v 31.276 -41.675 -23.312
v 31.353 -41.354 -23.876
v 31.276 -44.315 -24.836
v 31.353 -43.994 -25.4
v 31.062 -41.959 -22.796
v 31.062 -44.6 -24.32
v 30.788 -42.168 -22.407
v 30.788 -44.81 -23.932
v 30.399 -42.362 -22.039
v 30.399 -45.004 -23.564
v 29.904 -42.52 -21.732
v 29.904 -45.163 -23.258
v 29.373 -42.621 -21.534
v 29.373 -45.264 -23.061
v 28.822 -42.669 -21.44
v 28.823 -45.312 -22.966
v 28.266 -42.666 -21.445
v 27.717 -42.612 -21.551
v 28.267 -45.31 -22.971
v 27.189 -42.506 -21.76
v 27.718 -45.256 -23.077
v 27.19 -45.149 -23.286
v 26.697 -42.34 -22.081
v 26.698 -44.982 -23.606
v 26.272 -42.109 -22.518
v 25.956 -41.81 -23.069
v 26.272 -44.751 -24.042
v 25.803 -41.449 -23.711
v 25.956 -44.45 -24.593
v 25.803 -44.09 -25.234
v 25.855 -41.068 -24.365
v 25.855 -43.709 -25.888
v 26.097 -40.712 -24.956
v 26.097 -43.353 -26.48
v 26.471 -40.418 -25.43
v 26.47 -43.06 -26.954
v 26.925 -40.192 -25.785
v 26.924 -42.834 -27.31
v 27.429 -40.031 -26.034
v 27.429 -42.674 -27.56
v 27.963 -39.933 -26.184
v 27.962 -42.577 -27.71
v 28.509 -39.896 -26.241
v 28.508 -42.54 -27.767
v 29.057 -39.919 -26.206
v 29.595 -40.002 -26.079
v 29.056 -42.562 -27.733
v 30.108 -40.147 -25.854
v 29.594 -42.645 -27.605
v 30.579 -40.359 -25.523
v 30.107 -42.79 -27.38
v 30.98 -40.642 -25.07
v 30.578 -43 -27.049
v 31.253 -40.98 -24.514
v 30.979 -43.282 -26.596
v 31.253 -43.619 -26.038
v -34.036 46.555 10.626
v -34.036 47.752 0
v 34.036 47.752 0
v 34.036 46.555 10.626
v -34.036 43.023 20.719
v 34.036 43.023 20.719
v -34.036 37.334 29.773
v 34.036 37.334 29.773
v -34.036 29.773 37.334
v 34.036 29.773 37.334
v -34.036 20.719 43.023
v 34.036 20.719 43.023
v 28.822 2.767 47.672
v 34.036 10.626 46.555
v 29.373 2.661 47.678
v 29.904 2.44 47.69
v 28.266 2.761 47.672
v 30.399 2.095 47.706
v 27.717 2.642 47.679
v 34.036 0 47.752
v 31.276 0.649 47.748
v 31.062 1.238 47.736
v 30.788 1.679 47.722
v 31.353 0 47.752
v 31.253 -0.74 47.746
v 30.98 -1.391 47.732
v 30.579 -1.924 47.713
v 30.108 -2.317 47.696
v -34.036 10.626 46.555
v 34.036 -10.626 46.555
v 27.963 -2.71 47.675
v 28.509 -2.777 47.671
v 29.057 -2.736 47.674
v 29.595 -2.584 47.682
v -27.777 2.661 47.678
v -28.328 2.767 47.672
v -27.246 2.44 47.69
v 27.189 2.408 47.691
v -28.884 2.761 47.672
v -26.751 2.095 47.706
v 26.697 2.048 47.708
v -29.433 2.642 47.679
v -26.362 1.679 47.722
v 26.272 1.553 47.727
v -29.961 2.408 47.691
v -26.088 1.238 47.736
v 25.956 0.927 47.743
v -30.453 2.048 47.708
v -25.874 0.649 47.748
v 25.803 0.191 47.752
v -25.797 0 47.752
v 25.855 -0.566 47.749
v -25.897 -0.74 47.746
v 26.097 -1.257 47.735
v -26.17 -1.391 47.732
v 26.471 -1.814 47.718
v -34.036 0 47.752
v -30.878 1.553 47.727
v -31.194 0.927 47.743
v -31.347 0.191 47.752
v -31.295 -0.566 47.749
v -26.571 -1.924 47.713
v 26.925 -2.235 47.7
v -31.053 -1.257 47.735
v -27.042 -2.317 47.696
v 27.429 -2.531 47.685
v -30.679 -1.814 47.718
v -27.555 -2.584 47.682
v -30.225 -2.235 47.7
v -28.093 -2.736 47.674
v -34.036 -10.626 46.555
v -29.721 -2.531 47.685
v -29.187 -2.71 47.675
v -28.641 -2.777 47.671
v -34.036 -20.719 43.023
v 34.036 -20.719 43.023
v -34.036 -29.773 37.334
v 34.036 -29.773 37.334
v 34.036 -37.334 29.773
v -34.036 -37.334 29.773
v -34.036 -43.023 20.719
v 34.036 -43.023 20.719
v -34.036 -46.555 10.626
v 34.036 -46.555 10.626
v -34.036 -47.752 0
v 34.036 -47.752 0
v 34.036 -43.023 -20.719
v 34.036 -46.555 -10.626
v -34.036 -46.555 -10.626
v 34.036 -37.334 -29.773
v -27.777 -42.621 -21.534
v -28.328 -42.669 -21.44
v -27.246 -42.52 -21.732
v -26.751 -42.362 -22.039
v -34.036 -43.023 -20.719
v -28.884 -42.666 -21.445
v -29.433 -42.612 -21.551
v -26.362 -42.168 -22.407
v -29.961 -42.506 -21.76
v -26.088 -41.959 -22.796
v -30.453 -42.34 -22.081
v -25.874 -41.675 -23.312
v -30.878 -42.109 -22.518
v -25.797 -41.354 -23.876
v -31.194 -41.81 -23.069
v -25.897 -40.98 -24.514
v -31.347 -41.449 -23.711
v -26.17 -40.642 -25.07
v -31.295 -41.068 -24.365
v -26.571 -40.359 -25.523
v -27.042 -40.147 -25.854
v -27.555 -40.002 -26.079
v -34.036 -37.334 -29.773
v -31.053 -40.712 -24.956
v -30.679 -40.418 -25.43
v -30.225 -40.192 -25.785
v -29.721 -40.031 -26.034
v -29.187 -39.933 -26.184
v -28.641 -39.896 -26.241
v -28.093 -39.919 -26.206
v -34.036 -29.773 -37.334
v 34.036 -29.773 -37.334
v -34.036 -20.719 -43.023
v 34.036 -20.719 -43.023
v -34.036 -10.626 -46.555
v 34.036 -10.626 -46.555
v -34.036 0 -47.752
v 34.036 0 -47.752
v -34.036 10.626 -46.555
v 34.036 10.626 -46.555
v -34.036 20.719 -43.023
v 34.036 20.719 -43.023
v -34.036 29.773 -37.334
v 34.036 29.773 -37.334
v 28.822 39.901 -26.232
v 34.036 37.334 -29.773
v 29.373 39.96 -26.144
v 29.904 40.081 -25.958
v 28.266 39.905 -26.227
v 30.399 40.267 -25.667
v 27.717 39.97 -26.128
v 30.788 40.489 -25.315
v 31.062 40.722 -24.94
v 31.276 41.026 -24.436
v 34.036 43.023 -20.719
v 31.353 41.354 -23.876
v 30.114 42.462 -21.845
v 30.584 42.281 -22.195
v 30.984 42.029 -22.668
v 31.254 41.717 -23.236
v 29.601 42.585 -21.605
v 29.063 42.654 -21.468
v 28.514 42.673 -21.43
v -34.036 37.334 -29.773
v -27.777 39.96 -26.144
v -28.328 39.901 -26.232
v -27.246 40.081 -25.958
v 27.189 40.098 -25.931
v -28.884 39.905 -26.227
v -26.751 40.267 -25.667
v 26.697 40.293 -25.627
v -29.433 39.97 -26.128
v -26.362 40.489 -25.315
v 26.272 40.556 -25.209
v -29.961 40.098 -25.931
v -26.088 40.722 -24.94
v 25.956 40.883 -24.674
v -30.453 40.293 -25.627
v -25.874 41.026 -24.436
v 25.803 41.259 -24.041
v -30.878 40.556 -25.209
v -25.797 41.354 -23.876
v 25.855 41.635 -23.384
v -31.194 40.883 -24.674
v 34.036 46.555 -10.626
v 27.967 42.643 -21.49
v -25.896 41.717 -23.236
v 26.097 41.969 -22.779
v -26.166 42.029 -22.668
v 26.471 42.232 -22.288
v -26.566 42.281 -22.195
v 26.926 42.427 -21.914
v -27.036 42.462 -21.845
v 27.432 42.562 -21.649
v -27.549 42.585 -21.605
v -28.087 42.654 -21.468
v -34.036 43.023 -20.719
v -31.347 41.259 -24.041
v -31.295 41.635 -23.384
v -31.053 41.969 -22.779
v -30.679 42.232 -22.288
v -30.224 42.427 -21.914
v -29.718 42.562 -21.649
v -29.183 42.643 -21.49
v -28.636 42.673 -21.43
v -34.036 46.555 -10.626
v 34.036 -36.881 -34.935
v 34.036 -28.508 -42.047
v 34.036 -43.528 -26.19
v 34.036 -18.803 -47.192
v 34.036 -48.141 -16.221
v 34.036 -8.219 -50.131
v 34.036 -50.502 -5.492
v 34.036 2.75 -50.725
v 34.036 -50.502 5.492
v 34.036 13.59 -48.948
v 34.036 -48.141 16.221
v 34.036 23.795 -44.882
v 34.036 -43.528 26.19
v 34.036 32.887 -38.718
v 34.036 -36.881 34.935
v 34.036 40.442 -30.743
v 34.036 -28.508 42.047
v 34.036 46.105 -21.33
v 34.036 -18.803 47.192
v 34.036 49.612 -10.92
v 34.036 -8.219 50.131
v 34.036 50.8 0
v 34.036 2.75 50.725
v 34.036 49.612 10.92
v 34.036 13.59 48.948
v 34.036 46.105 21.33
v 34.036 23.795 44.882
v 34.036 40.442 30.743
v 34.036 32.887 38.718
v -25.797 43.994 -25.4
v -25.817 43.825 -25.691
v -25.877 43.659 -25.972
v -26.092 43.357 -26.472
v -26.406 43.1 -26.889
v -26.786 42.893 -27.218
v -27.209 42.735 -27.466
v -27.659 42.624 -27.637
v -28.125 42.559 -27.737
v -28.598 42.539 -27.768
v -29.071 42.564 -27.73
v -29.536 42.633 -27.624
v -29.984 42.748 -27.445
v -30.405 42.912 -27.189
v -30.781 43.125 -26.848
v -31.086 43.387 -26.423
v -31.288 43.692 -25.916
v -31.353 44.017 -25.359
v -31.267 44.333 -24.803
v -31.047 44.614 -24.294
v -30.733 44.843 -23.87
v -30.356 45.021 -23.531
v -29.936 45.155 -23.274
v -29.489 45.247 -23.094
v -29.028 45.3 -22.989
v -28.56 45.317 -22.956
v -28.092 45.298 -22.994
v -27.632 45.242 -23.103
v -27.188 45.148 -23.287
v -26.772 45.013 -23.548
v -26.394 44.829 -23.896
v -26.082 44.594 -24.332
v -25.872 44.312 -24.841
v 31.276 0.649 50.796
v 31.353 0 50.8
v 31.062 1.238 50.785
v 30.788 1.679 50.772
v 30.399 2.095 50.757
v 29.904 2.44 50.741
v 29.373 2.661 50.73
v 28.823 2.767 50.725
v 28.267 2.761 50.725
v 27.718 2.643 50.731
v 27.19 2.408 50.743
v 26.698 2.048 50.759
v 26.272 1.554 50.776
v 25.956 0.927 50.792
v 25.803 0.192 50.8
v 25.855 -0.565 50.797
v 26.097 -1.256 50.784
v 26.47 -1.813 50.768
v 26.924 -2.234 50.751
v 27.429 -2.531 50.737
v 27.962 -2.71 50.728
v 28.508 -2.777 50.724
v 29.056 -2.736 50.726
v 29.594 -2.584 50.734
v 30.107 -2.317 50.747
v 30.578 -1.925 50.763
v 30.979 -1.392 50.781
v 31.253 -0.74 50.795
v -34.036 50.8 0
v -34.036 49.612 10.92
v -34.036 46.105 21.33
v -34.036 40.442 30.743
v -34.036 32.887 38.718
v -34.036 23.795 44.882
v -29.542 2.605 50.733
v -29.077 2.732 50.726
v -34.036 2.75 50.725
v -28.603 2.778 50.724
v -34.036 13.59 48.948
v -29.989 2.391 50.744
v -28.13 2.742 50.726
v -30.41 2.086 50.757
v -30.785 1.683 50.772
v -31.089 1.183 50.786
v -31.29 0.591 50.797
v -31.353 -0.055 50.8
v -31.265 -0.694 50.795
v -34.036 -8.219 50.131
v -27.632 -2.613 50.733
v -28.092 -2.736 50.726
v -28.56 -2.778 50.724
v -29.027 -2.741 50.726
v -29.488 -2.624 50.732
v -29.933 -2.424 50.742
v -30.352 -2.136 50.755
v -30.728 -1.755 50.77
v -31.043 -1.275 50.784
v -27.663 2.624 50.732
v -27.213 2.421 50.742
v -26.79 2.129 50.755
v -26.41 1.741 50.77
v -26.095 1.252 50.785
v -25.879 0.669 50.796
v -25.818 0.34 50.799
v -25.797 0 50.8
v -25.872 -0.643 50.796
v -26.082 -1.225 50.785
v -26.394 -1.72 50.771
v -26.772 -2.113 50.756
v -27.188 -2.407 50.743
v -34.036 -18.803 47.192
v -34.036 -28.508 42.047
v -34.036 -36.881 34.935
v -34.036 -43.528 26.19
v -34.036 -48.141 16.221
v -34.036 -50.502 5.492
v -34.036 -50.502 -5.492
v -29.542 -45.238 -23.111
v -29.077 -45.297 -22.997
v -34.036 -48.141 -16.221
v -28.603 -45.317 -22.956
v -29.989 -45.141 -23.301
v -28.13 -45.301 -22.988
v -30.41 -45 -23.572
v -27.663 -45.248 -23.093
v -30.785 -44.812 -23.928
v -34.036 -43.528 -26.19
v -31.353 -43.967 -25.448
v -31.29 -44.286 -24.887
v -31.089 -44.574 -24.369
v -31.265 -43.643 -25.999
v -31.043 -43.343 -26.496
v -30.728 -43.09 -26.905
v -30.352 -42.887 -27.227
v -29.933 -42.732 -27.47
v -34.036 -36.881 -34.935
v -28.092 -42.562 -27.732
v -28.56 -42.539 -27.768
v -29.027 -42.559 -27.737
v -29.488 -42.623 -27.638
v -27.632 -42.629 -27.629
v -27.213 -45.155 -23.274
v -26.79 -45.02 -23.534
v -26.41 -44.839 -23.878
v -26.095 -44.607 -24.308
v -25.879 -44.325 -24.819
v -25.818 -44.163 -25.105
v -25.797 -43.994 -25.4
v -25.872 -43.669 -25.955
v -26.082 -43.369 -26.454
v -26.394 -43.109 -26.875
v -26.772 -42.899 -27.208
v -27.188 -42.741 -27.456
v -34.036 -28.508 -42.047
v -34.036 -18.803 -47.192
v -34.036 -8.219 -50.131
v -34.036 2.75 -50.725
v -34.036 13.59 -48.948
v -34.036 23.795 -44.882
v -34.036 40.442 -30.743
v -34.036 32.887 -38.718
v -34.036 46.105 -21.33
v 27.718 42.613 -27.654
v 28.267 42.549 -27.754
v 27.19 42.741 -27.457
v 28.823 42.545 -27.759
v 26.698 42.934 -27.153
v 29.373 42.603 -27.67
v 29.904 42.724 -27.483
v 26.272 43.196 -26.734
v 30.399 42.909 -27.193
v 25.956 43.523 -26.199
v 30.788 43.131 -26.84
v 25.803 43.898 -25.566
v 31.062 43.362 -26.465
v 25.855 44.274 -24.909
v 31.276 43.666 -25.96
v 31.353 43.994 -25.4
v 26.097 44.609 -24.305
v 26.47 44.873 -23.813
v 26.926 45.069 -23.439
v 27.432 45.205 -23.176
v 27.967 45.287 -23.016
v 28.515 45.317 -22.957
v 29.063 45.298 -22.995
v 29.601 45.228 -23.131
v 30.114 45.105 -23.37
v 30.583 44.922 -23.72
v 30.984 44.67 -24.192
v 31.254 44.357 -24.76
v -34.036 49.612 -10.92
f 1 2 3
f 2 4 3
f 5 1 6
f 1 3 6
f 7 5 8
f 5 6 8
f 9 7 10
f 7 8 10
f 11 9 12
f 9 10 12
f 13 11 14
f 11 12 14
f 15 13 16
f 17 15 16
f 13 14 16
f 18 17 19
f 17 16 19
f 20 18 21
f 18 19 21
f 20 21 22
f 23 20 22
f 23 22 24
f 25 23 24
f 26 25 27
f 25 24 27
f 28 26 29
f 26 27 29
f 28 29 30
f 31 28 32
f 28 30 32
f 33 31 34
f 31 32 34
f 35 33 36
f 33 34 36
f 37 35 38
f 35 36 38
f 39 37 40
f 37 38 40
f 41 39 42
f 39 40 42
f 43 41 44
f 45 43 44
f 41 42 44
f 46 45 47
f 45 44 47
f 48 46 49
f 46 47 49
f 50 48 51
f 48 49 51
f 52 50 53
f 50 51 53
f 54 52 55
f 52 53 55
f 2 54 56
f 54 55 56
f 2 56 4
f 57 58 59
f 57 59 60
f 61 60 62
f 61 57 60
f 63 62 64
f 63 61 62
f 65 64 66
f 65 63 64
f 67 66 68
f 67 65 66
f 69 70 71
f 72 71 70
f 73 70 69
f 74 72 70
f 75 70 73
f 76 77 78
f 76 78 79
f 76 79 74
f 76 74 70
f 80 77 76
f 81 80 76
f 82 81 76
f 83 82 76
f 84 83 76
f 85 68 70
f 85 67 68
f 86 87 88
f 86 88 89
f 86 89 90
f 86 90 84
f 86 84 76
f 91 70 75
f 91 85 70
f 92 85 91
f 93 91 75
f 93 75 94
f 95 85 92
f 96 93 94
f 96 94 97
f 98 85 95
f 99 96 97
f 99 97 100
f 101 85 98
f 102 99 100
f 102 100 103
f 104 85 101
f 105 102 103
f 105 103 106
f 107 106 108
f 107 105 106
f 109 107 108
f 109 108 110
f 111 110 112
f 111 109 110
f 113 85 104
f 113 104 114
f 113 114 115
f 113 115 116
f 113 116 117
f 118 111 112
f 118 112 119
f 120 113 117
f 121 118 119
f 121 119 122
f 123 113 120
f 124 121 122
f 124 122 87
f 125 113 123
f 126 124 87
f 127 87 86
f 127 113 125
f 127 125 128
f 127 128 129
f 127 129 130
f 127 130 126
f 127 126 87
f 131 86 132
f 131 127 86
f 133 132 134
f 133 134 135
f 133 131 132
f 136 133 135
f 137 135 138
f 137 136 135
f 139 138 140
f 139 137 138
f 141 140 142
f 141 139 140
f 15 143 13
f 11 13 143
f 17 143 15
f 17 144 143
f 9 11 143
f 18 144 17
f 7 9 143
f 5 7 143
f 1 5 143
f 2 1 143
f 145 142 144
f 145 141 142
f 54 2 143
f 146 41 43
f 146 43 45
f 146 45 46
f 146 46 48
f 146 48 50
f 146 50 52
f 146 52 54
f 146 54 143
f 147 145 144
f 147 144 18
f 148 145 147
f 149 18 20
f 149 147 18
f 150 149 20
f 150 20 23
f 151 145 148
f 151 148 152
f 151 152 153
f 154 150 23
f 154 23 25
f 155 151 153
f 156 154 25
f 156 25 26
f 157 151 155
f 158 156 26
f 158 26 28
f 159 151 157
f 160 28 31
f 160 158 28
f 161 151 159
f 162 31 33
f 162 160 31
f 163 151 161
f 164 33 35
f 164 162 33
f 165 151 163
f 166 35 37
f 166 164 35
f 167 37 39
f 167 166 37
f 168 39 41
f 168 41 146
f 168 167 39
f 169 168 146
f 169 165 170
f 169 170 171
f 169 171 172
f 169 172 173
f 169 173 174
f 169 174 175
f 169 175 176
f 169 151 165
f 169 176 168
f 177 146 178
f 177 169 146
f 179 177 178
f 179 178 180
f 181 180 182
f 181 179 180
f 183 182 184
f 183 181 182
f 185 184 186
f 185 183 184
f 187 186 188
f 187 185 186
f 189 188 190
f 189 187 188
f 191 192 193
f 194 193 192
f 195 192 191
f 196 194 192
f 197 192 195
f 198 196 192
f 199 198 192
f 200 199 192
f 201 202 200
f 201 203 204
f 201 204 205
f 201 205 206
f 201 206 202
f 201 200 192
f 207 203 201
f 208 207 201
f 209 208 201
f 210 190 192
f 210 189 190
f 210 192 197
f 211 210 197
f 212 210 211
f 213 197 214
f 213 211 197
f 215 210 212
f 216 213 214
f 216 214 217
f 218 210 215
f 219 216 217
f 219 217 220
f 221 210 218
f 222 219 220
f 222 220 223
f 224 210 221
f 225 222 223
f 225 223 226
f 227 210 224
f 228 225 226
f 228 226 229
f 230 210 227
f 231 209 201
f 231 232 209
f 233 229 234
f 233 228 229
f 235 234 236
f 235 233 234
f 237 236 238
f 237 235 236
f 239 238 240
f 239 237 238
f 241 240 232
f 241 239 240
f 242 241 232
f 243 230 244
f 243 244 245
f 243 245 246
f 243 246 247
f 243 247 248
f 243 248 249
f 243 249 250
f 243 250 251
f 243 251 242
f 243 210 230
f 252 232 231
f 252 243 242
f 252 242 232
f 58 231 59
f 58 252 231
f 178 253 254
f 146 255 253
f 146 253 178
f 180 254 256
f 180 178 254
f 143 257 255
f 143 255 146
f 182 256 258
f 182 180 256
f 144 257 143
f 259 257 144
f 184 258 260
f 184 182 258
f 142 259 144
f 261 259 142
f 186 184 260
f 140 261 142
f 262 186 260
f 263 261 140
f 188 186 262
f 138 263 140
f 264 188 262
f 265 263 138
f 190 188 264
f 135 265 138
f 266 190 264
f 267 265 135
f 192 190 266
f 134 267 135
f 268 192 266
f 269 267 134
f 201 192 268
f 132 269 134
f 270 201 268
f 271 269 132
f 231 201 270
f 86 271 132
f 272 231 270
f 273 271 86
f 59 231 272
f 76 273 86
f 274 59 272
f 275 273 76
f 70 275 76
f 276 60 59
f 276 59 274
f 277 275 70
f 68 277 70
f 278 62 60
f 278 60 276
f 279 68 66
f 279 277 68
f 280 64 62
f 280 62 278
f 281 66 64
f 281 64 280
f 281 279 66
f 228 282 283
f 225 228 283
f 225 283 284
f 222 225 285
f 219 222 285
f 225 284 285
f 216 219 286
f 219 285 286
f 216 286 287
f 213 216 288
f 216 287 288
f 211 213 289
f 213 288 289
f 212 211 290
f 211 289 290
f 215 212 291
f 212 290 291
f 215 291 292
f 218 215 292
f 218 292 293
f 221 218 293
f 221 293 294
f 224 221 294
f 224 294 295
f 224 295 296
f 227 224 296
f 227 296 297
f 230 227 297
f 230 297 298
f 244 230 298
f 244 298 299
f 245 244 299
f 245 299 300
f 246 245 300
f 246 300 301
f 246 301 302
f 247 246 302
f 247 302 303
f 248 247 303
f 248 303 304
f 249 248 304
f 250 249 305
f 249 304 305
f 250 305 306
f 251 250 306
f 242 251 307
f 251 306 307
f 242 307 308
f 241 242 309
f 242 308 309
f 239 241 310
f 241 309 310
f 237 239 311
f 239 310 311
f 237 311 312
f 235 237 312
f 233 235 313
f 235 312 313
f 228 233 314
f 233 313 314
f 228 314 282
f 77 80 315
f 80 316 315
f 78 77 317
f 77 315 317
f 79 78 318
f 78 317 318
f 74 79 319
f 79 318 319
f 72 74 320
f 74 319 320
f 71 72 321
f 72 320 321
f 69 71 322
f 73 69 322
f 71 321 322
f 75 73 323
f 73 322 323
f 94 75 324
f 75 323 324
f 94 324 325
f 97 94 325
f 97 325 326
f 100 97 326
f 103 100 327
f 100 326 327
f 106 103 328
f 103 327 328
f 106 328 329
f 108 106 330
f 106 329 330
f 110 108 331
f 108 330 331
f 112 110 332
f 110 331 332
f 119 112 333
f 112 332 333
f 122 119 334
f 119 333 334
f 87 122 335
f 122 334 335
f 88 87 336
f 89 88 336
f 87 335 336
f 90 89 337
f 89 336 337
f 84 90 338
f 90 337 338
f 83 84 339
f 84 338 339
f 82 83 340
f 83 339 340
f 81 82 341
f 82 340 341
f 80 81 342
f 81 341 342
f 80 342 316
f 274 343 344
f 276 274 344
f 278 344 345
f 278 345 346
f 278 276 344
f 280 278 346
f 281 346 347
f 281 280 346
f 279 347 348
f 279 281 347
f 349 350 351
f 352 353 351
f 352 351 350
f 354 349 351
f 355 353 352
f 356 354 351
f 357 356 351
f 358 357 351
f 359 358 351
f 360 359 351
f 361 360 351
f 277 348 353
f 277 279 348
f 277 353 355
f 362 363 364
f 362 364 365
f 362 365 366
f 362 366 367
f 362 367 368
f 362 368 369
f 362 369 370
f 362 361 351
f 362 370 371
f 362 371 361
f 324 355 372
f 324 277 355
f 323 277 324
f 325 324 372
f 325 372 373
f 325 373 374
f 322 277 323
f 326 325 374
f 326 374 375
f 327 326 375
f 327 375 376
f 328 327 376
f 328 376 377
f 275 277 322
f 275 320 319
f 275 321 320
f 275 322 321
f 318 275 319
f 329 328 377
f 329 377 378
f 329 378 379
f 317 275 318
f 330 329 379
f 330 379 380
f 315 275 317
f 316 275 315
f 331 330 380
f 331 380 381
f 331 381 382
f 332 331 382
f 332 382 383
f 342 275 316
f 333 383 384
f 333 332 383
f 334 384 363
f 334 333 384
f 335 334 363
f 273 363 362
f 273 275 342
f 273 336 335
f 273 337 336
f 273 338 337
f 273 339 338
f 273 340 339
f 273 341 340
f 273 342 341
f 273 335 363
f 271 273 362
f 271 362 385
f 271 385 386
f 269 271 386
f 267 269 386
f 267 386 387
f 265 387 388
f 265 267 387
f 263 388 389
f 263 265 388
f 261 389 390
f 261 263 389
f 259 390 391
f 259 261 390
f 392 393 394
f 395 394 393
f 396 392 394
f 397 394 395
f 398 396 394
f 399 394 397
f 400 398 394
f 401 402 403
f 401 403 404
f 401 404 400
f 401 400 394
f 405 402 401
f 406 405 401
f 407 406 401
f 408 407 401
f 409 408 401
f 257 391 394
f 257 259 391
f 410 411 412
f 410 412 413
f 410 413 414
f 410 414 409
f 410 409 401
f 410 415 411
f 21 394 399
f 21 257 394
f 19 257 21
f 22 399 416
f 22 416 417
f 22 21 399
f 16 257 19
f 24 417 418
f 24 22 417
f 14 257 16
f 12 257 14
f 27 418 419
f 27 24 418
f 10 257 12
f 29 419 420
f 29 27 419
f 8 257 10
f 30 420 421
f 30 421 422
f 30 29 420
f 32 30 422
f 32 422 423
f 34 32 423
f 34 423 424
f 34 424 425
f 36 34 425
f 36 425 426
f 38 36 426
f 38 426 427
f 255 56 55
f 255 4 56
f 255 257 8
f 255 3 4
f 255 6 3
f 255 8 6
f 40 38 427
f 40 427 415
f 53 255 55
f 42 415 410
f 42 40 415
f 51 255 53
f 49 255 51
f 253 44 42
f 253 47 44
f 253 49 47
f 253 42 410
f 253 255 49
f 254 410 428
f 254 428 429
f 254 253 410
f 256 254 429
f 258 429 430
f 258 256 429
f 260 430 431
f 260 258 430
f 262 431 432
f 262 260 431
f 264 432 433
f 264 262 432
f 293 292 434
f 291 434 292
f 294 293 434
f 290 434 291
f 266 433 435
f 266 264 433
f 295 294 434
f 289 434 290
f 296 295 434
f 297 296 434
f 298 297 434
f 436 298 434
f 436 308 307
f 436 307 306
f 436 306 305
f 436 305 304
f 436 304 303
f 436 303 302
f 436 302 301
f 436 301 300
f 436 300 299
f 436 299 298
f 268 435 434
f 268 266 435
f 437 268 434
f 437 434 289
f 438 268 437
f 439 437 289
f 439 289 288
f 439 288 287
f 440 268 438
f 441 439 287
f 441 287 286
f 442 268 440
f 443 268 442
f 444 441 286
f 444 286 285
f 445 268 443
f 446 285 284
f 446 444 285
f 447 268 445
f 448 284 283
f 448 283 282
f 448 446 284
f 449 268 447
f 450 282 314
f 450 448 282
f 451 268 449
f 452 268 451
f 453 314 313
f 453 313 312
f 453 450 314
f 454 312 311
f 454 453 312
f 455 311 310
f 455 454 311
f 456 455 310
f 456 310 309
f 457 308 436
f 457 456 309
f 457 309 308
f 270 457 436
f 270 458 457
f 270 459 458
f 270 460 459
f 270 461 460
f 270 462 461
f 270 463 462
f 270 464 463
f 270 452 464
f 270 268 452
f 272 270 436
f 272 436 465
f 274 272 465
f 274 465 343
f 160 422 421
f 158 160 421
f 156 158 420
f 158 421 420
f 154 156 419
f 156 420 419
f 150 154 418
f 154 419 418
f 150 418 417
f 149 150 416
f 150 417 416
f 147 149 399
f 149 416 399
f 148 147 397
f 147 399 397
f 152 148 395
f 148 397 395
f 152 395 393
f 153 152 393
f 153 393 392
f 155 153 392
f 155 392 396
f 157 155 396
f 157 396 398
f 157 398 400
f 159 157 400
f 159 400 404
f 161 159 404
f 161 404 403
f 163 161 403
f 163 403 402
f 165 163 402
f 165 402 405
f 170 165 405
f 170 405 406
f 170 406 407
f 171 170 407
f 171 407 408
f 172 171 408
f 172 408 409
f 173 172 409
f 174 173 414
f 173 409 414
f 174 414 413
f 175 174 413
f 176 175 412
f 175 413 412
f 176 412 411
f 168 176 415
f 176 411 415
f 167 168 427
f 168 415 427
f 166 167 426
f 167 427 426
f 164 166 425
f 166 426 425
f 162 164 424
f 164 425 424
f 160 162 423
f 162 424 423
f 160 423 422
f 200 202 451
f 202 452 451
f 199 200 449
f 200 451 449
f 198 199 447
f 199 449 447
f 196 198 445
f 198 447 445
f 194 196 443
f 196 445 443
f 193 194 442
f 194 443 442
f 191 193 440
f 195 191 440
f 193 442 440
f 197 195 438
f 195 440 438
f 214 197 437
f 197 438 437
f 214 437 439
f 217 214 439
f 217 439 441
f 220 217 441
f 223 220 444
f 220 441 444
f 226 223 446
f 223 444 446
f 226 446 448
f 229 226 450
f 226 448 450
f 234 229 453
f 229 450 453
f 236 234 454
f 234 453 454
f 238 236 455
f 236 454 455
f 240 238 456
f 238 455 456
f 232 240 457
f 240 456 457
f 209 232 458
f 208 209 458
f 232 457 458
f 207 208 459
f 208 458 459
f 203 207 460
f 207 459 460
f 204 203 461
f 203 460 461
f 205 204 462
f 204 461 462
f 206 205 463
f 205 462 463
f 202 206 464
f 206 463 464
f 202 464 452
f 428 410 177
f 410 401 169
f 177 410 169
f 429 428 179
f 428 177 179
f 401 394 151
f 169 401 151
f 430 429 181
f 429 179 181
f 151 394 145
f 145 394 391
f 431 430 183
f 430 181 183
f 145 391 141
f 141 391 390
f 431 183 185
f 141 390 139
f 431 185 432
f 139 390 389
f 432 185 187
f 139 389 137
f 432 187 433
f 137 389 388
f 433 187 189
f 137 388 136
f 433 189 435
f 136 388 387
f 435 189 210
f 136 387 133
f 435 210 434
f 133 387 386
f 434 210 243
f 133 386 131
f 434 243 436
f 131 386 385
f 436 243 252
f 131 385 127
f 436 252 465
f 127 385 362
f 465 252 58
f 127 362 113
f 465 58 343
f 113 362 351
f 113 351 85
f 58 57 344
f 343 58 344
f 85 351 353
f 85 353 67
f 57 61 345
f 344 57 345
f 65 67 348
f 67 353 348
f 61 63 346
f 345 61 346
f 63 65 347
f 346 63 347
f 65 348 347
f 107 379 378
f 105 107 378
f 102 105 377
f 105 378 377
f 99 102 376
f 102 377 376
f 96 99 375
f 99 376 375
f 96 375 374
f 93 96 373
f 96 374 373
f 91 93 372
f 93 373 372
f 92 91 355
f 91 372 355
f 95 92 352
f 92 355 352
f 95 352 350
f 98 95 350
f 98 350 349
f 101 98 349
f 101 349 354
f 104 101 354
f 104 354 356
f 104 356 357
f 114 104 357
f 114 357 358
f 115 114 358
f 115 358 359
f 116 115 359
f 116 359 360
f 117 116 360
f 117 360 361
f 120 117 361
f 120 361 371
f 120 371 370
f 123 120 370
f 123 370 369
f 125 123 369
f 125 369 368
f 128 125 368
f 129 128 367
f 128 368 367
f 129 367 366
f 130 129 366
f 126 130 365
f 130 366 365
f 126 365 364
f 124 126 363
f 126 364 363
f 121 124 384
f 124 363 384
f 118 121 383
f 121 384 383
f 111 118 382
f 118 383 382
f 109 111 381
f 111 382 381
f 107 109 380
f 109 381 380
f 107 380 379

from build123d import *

# Parameters (mm, degrees)
F0_R     = 50.8
F0_R_2   = 47.752
F1_DEPTH = 34.036
F3_R     = 2.778125
F4_DEPTH = 12.7
F6_COUNT = 3
F6_ANGLE = 240


with BuildPart() as f1:
    # F0 (on Right) → F1 (new body, symmetric)
    with BuildSketch(Plane.YZ):
        Circle(F0_R)
        Circle(F0_R_2, mode=Mode.SUBTRACT)
    extrude(amount=F1_DEPTH, both=True)


with BuildPart() as f4:
    # F3 (on offset) → F4 (new body, symmetric)
    with BuildSketch(Plane.XY.offset(50.8)):
        with Locations((-28.575, 0)):
            Circle(F3_R)
        with Locations((28.575, 0)):
            Circle(F3_R)
    extrude(amount=F4_DEPTH, both=True)


with BuildPart() as f6_1:
    # F6: instance of F4
    add(f4.part.rotate(Axis((2.265271, 0, 0), (1, 0, 0)), 1 * F6_ANGLE / (F6_COUNT - 1)))


with BuildPart() as f6_2:
    # F6: instance of F4
    add(f4.part.rotate(Axis((2.265271, 0, 0), (1, 0, 0)), 2 * F6_ANGLE / (F6_COUNT - 1)))


with BuildPart() as f1_1:
    add(f1.part)

    # F7: cut F4, F6_2, F6_1
    add(f4.part, mode=Mode.SUBTRACT)
    add(f6_2.part, mode=Mode.SUBTRACT)
    add(f6_1.part, mode=Mode.SUBTRACT)


solid = f1_1.part
